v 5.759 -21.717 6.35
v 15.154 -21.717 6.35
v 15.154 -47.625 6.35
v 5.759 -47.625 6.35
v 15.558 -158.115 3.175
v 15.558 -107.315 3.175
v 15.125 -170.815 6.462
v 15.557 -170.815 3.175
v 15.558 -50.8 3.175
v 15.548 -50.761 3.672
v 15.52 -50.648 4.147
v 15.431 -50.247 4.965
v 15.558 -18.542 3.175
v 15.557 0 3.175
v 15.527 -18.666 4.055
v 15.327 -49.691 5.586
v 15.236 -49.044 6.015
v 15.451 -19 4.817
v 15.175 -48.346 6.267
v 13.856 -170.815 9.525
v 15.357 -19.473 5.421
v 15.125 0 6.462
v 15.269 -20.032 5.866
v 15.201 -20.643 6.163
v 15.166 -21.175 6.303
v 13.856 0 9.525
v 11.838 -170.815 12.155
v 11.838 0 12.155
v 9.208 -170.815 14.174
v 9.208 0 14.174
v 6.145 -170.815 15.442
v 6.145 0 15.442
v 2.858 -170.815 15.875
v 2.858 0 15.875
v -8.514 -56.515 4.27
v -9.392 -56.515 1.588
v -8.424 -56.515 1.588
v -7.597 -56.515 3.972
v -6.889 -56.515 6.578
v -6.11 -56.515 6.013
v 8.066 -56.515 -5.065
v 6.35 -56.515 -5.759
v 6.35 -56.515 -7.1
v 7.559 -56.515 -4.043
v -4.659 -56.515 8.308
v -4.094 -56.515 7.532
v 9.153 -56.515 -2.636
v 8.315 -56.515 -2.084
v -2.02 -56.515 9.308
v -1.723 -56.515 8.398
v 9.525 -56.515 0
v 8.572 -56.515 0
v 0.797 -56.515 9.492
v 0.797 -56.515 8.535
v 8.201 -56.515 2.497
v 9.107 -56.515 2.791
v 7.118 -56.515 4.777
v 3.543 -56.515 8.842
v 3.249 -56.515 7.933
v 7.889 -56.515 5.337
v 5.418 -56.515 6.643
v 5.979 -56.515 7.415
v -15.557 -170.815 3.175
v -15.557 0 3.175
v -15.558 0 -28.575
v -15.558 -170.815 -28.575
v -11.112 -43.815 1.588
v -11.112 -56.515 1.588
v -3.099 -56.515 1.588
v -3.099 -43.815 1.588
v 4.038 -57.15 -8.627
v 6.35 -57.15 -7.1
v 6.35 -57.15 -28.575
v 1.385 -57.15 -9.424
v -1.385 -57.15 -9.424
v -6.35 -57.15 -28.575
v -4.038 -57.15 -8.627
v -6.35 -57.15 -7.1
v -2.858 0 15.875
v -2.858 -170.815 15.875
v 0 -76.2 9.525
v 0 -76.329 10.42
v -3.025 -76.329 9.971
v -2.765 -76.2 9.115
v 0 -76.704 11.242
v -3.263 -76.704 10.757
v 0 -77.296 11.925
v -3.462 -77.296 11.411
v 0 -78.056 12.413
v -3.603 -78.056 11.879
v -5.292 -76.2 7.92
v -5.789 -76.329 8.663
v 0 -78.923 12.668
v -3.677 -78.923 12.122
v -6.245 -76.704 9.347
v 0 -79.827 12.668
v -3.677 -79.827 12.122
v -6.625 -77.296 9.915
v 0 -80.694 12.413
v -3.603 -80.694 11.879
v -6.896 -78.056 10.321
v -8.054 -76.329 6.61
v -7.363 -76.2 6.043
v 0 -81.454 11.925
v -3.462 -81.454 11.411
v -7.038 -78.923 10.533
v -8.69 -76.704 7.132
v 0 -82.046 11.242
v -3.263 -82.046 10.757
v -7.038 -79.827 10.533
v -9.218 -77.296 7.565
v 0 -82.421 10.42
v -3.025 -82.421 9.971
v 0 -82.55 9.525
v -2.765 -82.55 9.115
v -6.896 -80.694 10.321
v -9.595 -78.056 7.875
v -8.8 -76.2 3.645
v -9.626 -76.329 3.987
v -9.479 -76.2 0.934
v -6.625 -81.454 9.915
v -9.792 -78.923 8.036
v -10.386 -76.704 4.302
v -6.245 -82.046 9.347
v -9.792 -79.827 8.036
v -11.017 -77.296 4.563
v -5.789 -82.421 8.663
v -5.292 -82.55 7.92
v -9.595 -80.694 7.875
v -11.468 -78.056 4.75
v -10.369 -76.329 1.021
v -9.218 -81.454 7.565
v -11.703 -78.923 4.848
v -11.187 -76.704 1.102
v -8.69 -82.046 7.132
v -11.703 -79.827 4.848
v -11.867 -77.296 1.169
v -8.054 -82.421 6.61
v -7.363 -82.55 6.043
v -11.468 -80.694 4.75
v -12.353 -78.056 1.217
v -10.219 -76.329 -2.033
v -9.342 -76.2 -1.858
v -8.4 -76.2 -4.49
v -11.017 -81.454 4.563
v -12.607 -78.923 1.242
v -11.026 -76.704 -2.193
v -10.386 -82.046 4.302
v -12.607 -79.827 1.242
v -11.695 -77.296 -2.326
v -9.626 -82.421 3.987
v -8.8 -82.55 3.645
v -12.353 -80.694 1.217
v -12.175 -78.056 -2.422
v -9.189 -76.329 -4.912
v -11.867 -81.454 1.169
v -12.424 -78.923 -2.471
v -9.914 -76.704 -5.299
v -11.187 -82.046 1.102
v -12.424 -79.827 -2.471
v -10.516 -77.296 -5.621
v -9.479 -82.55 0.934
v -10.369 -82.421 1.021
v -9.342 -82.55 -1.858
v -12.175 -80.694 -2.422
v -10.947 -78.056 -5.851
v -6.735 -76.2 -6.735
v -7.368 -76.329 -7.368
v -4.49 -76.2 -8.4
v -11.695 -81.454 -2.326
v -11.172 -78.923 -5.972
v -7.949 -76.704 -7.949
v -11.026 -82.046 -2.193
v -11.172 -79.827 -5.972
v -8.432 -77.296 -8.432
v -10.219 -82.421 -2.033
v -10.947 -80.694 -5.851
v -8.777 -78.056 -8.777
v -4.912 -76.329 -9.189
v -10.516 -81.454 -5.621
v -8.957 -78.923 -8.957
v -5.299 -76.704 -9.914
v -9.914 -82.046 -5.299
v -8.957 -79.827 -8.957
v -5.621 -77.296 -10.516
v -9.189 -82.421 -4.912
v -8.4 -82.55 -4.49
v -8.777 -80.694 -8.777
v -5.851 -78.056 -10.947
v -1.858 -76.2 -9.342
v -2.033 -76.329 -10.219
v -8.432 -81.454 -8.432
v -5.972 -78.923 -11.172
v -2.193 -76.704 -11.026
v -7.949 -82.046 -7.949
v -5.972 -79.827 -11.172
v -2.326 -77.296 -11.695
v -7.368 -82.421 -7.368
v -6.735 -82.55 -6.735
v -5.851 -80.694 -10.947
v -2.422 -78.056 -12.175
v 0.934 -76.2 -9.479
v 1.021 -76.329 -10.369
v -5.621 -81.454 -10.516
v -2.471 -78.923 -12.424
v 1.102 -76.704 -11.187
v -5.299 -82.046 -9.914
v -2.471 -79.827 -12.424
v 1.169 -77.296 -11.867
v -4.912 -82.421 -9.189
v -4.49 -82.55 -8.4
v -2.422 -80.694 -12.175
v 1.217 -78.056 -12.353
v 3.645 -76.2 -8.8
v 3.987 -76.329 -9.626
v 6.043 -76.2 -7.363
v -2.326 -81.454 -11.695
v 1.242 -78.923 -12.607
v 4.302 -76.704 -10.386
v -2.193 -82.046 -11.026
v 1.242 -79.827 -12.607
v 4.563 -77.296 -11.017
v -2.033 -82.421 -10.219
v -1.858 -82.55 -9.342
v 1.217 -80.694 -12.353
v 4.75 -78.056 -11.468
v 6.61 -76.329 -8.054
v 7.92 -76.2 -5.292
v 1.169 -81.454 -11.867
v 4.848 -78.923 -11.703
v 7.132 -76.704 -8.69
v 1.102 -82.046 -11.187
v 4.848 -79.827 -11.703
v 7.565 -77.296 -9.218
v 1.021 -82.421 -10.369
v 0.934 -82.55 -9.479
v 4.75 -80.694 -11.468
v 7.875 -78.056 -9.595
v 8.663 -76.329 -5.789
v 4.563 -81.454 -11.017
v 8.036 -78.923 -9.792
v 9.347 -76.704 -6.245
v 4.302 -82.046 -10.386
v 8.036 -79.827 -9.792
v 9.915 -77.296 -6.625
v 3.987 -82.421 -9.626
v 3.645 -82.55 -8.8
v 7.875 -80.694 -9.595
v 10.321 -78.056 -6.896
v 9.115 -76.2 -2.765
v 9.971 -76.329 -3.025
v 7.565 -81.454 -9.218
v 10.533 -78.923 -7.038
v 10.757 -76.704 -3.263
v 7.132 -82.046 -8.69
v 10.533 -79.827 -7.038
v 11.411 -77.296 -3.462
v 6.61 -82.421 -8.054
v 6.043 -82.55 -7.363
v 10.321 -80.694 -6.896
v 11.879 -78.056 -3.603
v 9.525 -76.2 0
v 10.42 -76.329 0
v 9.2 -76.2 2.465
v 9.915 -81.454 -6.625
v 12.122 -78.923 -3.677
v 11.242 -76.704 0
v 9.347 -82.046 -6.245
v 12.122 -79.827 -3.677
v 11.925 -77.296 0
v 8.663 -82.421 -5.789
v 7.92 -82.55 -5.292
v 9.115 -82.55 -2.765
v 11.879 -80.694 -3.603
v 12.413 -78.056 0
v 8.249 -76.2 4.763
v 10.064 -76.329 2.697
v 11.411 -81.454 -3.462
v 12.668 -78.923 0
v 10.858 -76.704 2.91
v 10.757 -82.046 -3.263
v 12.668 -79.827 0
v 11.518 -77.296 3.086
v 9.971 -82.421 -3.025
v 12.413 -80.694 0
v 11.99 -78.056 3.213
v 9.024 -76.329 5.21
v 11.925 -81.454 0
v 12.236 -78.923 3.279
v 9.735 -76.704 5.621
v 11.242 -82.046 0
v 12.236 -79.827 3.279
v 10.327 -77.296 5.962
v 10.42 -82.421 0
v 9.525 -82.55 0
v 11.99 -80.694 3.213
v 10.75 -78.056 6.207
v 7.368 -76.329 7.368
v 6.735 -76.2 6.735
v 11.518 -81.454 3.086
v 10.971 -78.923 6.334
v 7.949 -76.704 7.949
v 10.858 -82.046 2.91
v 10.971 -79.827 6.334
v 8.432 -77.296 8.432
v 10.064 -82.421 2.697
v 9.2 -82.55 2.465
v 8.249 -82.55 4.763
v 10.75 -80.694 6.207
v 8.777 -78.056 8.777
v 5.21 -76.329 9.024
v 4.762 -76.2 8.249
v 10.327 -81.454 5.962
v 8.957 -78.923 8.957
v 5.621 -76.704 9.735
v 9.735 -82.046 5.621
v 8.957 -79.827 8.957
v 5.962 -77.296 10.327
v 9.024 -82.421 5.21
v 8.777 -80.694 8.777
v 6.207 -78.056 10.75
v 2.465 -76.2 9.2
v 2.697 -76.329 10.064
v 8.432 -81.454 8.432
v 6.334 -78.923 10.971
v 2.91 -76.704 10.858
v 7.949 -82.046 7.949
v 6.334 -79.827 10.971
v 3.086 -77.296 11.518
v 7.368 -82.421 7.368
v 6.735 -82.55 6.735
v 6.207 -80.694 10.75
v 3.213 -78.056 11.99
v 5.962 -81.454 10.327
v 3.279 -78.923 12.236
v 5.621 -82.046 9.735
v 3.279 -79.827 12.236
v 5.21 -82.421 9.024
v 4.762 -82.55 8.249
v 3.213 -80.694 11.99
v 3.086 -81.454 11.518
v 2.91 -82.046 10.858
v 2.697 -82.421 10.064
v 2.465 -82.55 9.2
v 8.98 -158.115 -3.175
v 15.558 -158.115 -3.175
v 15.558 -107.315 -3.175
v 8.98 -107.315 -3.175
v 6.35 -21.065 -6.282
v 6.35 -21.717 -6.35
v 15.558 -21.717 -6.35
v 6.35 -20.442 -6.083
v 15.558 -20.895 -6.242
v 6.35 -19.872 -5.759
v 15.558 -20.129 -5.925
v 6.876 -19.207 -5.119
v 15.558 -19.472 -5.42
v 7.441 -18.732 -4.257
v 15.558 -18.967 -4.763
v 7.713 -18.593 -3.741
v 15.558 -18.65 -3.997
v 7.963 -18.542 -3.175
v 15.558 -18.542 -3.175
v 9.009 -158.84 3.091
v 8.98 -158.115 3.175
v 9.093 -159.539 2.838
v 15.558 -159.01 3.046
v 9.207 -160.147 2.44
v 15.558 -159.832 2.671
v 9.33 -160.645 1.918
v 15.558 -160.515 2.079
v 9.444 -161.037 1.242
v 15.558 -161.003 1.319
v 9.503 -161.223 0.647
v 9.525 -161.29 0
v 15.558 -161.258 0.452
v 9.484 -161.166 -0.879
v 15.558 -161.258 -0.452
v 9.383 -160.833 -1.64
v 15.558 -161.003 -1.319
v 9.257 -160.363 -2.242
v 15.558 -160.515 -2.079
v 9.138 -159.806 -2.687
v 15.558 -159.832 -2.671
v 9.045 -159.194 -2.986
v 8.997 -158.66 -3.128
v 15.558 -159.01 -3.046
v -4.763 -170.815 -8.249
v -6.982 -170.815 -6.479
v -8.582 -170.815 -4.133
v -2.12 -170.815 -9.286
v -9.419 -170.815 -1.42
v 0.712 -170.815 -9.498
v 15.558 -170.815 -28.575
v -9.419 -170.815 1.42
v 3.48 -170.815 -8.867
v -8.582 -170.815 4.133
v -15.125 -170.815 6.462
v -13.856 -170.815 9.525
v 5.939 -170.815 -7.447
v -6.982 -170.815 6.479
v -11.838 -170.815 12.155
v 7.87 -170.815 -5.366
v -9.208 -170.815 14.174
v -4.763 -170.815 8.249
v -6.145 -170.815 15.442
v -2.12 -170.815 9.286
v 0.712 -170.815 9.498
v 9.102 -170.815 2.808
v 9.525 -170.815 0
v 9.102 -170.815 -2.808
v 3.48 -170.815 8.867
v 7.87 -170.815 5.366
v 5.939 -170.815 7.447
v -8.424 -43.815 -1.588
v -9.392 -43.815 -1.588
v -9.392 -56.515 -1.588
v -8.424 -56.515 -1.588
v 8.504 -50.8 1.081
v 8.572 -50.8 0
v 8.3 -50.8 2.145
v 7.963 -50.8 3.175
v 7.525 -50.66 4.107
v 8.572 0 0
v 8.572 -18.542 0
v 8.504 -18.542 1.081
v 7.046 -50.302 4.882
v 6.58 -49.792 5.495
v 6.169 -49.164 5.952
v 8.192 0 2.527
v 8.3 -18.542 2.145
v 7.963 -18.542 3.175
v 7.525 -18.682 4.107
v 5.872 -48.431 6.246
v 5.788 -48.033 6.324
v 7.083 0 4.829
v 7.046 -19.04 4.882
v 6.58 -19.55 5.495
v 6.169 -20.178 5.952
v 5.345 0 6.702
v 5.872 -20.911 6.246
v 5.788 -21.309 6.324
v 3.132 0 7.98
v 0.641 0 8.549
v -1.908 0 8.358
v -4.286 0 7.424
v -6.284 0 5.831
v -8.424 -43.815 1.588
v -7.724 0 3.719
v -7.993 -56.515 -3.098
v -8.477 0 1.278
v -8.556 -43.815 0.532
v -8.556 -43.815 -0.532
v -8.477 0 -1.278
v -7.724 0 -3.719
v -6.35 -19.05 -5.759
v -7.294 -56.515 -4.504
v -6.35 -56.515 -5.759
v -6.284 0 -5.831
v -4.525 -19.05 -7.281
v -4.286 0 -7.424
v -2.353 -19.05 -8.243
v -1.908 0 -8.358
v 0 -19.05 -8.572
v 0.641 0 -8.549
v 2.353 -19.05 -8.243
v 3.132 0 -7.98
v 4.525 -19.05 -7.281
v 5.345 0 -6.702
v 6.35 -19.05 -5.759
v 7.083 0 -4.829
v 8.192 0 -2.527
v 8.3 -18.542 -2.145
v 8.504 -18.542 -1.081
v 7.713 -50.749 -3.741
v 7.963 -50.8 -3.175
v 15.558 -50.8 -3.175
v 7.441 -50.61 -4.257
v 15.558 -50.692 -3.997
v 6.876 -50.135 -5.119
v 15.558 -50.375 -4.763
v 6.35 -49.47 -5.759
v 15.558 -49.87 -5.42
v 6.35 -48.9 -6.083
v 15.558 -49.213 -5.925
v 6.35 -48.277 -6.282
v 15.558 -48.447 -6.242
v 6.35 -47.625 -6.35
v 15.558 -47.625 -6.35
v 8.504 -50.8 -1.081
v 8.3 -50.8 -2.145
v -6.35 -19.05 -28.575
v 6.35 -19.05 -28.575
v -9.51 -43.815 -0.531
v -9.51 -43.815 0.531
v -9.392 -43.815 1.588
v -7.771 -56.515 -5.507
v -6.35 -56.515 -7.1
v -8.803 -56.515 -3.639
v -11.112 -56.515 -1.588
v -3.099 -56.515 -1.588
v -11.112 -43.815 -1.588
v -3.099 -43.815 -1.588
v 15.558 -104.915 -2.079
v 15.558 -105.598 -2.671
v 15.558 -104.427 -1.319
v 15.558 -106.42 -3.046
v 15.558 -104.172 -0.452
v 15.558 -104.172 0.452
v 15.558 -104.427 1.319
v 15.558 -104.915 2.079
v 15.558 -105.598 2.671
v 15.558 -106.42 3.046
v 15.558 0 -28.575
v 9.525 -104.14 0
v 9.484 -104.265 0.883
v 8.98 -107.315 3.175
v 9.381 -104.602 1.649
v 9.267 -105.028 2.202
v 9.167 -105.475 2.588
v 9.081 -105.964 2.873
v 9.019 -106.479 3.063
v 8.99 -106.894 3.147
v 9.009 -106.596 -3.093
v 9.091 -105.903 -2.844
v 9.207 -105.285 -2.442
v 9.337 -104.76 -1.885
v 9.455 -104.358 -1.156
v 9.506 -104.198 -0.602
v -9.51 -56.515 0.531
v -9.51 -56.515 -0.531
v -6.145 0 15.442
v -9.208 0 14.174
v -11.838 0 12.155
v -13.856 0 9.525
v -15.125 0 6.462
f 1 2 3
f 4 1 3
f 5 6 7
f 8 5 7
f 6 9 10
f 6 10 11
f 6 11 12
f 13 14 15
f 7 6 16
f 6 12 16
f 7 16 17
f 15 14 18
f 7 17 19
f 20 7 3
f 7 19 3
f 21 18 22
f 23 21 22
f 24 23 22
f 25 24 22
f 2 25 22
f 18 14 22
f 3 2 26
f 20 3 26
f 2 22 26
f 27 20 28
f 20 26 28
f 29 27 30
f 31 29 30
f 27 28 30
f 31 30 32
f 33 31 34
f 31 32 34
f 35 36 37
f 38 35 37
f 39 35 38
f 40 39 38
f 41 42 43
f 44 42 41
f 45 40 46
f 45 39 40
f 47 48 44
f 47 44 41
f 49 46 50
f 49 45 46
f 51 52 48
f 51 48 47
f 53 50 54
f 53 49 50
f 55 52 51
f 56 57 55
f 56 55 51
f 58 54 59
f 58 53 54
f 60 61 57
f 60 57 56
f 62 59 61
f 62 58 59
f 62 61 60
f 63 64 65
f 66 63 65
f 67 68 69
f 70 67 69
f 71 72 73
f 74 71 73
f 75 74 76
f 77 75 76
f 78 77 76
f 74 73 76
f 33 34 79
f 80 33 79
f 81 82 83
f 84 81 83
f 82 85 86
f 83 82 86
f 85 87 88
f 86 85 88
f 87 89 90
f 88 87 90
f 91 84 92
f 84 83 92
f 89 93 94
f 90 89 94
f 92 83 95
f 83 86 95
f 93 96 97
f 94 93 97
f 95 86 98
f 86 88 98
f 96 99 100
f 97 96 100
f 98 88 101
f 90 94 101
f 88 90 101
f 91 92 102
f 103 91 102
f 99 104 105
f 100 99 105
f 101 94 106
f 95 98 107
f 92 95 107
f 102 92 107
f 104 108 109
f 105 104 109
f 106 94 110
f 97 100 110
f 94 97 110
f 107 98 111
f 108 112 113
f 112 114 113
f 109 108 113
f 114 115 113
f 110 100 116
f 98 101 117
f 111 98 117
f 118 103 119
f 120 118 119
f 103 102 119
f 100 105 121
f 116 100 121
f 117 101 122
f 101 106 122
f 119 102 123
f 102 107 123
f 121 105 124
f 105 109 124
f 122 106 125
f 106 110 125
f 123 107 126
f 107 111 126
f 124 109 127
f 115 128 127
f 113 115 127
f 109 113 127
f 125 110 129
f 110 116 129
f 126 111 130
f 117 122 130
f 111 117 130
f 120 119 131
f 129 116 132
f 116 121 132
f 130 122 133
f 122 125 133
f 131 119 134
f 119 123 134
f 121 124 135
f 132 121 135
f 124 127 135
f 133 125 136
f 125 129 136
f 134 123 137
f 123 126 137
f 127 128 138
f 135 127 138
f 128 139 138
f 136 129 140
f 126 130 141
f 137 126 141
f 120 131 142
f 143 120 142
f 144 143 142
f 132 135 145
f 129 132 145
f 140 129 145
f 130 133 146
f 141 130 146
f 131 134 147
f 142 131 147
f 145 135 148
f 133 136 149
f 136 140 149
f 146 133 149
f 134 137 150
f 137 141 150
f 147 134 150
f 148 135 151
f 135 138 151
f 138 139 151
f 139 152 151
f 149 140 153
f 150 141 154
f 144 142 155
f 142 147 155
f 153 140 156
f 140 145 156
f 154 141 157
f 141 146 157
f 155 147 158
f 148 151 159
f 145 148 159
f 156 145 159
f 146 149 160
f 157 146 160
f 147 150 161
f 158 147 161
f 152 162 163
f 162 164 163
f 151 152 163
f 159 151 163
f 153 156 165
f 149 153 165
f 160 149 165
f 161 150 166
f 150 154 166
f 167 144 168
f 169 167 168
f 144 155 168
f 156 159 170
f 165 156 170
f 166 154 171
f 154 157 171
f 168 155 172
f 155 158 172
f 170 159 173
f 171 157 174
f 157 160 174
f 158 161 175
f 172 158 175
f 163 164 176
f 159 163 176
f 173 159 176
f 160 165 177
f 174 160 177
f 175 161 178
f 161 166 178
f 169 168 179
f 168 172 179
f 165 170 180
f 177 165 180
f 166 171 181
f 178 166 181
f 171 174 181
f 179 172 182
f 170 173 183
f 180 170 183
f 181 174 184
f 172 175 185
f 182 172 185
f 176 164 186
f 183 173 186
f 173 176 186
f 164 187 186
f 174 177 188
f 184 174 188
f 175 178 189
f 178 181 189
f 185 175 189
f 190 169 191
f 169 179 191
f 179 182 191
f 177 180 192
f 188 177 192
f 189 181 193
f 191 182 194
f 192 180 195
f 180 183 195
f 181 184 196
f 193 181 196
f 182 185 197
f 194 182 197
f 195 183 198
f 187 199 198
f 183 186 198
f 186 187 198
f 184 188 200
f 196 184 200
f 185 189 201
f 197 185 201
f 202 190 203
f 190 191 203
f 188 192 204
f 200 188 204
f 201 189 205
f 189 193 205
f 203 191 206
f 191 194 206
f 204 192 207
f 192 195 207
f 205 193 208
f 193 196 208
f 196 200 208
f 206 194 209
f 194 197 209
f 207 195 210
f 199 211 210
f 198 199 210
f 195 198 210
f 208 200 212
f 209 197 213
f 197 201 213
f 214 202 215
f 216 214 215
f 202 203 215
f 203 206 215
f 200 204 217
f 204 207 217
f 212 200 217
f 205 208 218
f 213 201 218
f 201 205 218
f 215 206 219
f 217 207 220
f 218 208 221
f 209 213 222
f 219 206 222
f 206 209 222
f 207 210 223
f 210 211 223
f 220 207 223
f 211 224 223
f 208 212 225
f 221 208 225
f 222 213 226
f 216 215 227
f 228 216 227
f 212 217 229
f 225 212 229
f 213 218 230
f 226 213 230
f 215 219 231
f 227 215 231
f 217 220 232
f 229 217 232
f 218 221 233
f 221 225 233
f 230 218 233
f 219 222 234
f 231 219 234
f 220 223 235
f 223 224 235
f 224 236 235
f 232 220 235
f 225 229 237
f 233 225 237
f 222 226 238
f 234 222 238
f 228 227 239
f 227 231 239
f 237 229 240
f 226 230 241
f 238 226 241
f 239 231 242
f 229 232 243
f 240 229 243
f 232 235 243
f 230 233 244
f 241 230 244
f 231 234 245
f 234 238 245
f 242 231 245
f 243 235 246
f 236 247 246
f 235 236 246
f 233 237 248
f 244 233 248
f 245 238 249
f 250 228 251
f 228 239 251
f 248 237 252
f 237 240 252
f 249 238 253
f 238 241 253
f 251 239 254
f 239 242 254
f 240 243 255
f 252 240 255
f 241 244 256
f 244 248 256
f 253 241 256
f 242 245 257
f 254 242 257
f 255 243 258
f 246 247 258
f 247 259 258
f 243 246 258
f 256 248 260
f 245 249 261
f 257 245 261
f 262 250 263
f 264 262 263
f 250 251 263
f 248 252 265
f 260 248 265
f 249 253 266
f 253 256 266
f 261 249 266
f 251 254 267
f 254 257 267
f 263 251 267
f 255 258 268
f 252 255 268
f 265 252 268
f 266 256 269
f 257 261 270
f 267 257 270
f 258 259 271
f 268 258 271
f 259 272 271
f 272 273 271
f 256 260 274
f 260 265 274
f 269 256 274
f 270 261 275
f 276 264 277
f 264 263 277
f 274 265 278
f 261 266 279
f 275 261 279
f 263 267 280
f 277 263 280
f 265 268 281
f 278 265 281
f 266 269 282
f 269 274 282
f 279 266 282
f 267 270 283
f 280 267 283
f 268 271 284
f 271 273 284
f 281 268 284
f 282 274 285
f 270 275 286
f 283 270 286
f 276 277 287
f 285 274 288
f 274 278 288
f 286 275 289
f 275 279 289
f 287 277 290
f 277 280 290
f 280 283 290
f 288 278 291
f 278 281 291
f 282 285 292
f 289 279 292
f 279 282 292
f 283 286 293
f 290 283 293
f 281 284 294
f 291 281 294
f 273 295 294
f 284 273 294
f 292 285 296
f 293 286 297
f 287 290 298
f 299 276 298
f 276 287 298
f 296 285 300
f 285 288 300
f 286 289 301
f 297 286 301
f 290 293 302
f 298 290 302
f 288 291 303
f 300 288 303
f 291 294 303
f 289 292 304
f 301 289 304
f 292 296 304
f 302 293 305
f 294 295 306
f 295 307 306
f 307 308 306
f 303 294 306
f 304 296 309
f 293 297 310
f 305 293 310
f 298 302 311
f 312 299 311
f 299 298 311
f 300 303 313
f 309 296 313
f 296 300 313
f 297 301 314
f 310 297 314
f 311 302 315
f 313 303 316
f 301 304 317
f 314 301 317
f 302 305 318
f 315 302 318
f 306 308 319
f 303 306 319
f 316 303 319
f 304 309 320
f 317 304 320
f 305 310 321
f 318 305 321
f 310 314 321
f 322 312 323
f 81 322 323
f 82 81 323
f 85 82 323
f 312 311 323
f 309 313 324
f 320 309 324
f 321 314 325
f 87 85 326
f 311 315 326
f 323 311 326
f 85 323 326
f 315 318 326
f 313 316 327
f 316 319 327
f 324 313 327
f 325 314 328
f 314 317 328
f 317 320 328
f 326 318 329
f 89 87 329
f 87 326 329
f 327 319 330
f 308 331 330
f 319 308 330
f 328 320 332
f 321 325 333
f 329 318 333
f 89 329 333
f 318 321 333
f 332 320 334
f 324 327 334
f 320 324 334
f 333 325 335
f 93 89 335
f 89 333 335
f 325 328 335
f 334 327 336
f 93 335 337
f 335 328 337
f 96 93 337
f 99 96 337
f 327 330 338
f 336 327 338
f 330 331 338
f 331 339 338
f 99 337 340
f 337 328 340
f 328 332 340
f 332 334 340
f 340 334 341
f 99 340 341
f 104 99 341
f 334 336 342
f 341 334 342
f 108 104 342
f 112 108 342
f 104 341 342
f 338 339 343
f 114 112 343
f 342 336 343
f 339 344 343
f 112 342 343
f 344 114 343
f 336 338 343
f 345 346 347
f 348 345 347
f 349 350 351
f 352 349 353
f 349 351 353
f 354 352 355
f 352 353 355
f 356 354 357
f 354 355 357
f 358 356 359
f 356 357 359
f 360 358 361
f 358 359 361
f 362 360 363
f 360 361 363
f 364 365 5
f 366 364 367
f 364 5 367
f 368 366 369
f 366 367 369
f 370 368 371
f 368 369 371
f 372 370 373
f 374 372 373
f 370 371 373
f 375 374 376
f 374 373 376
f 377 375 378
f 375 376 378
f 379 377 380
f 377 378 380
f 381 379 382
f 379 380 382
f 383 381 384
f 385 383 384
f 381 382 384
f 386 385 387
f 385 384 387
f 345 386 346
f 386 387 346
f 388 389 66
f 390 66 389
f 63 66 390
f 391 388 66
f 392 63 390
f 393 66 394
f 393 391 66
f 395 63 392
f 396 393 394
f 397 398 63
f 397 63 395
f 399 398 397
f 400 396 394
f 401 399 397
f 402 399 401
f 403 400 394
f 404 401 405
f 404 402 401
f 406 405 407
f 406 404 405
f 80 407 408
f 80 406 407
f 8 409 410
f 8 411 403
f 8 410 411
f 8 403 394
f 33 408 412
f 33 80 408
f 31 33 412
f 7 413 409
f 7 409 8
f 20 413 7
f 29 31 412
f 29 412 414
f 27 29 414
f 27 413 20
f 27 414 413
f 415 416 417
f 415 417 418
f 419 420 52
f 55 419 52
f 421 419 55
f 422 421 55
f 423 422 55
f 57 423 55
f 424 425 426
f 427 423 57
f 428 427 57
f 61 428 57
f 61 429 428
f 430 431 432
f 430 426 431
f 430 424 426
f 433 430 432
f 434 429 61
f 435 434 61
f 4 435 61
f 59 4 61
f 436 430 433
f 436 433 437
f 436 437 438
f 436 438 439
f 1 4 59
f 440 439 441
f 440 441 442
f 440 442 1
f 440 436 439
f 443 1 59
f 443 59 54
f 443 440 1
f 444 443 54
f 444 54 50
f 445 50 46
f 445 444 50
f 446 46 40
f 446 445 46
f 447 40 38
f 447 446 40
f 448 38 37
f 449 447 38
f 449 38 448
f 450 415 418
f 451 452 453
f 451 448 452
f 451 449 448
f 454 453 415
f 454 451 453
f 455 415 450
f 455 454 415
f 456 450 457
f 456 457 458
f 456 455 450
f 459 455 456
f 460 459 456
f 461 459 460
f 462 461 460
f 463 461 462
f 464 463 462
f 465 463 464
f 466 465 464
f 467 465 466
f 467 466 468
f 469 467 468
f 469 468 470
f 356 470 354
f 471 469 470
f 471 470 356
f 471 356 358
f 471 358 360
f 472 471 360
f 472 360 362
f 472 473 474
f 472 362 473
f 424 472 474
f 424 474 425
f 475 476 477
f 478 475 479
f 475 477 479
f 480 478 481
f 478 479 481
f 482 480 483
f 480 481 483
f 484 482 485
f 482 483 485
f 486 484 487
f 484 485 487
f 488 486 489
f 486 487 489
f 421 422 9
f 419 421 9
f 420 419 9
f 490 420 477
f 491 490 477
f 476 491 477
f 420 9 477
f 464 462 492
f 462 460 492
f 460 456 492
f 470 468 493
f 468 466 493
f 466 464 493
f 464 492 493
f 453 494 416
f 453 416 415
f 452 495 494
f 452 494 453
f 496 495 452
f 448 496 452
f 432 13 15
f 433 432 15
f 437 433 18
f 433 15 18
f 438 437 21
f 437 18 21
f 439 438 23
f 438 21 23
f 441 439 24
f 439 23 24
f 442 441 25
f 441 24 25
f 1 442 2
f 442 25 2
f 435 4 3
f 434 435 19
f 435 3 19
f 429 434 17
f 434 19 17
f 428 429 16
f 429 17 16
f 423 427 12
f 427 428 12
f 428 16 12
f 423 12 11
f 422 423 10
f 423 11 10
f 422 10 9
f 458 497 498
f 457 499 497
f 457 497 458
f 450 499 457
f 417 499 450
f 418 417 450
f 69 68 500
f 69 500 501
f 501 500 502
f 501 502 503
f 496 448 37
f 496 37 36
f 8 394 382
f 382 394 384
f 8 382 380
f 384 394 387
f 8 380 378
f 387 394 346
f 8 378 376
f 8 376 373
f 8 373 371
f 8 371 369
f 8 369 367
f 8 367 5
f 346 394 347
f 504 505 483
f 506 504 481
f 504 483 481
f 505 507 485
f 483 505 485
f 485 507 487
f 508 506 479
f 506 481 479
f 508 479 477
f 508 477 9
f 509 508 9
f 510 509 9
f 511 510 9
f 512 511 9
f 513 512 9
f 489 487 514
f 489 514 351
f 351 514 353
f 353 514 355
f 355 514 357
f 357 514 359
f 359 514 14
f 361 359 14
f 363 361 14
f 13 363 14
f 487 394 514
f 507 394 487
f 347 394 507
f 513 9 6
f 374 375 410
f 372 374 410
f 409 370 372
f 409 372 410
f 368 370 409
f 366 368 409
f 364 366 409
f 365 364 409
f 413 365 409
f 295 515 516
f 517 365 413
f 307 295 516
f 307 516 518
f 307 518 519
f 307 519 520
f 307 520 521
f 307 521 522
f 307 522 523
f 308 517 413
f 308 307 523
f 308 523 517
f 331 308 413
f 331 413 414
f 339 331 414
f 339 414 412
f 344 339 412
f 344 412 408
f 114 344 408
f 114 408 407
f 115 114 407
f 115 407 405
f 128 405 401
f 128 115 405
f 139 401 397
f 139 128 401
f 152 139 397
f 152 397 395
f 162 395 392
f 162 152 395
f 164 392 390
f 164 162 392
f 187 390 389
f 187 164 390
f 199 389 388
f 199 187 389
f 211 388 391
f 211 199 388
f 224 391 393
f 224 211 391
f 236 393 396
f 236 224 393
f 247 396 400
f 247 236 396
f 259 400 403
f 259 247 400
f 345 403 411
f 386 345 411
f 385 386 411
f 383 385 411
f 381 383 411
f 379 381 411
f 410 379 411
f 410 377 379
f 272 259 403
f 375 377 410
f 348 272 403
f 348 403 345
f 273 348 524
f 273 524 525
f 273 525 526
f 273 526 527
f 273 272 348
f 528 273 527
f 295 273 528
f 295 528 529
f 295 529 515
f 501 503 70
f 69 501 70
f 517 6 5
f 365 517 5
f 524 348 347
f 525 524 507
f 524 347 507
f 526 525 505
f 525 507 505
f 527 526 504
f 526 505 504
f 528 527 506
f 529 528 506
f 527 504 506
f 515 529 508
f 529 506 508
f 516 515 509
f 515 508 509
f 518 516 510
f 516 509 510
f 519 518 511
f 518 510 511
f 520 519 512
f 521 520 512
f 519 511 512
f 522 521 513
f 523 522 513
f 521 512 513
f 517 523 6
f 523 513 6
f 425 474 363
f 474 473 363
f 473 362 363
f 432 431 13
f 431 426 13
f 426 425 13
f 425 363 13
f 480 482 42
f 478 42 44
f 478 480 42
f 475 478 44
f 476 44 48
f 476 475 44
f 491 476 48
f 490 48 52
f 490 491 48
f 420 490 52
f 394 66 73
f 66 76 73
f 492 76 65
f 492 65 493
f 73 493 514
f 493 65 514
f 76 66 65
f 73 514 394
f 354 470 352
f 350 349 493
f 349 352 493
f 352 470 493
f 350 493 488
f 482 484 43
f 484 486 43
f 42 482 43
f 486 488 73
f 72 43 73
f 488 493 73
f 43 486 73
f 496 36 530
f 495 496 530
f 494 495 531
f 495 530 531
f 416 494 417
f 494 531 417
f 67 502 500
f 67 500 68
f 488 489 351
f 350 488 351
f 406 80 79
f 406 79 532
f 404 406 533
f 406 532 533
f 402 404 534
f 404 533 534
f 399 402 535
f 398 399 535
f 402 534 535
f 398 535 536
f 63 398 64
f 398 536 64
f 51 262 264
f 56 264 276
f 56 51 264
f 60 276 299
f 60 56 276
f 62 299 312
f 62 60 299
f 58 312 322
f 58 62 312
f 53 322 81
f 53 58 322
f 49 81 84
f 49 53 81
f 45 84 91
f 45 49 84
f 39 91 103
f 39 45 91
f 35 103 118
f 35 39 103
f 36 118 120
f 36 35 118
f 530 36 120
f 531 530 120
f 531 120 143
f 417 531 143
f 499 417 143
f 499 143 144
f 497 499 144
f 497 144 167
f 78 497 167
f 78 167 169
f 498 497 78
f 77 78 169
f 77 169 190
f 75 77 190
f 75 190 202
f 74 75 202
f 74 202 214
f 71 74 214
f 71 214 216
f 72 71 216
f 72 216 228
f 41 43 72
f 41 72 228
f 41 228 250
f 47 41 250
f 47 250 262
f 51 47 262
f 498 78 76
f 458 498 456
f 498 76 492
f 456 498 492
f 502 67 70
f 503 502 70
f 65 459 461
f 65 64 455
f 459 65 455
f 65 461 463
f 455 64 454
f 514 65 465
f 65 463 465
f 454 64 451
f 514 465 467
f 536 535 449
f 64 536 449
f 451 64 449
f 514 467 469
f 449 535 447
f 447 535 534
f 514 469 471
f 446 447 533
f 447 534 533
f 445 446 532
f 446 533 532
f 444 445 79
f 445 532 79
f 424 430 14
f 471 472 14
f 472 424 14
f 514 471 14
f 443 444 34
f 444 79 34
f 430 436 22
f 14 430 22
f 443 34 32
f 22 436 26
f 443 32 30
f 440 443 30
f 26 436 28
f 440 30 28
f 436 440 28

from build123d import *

# Parameters (mm, degrees)
F0_R      = 9.525
F1_DEPTH  = 170.815
F0_R_2    = 8.5725
F2_DEPTH  = 56.515
F4_DEPTH  = 19.05
F6_DEPTH  = 12.7
F5_W      = 8.0137
F5_H      = 3.175
F7_DEPTH  = 12.7
F11_DEPTH = 12.7
F13_DEPTH = 29.21


with BuildPart() as f1:
    # F0 (on Front) → F1 (new body)
    with BuildSketch(Plane.XZ):
        with BuildLine():
            Line((2.8575, 15.875), (-2.8575, 15.875))
            ThreePointArc((-2.8575, 15.875), (-11.8377561211, 12.1552561211), (-15.5575, 3.175))
            Line((-15.5575, 3.175), (-15.5575, -28.575))
            Line((-15.5575, -28.575), (15.5575, -28.575))
            Line((15.5575, -28.575), (15.5575, 3.175))
            ThreePointArc((15.5575, 3.175), (11.8377561211, 12.1552561211), (2.8575, 15.875))
        make_face()
        Circle(F0_R, mode=Mode.SUBTRACT)
    extrude(amount=F1_DEPTH)

    # F0 (on Front) → F2 (join)
    with BuildSketch(Plane.XZ):
        Circle(F0_R)
        Circle(F0_R_2, mode=Mode.SUBTRACT)
    extrude(amount=F2_DEPTH)

    # F3 (on face) → F4 (cut)
    with BuildSketch(Plane.YZ.offset(15.5575)):
        with BuildLine():
            Line((-21.717, 6.35), (-47.625, 6.35))
            ThreePointArc((-47.625, 6.35), (-49.8700640303, 5.4200640303), (-50.8, 3.175))
            Line((-50.8, 3.175), (-18.542, 3.175))
            ThreePointArc((-18.542, 3.175), (-19.4719359697, 5.4200640303), (-21.717, 6.35))
        make_face()
        with BuildLine():
            Line((-18.542, 3.175), (-50.8, 3.175))
            Line((-50.8, 3.175), (-50.8, -3.175))
            ThreePointArc((-50.8, -3.175), (-49.8700640303, -5.4200640303), (-47.625, -6.35))
            Line((-47.625, -6.35), (-21.717, -6.35))
            ThreePointArc((-21.717, -6.35), (-19.4719359697, -5.4200640303), (-18.542, -3.175))
            Line((-18.542, -3.175), (-18.542, 3.175))
        make_face()
    extrude(amount=-F4_DEPTH, mode=Mode.SUBTRACT)

    # F5 (on face) → F6 (cut)
    with BuildSketch(Plane.XZ.offset(56.515)):
        with BuildLine():
            ThreePointArc((-8.4242269675, -1.5875), (-8.5725, 0), (-8.4242269675, 1.5875))
            Line((-8.4242269675, 1.5875), (-9.3917766557, 1.5875))
            ThreePointArc((-9.3917766557, 1.5875), (-9.525, 0), (-9.3917766557, -1.5875))
            Line((-9.3917766557, -1.5875), (-8.4242269675, -1.5875))
        make_face()
    extrude(amount=-F6_DEPTH, mode=Mode.SUBTRACT)

    # F8 (on Right) → F9 (revolve, cut)
    with BuildSketch(Plane.YZ):
        with BuildLine():
            Line((-76.2, 0), (-76.2, 9.525))
            ThreePointArc((-76.2, 9.525), (-79.375, 12.7), (-82.55, 9.525))
            Line((-82.55, 9.525), (-82.55, 0))
            Line((-82.55, 0), (-76.2, 0))
        make_face()
    revolve(axis=Axis((0, -79.375, 0), (0, -1, 0)), mode=Mode.SUBTRACT)

    # F10 (on face) → F11 (cut)
    with BuildSketch(Plane.YZ.offset(15.5575)):
        with BuildLine():
            ThreePointArc((-107.315, -3.175), (-104.14, 0), (-107.315, 3.175))
            Line((-107.315, 3.175), (-158.115, 3.175))
            ThreePointArc((-158.115, 3.175), (-161.29, 0), (-158.115, -3.175))
            Line((-158.115, -3.175), (-107.315, -3.175))
        make_face()
    extrude(amount=-F11_DEPTH, mode=Mode.SUBTRACT)

    # F12 (on face) → F13 (cut)
    with BuildSketch(Plane(origin=(0, 0, -28.575), x_dir=(1, 0, 0), z_dir=(0, 0, -1))):
        Polygon((-6.35, 19.05), (0, 19.05), (6.35, 19.05), (6.35, 57.15), (0, 57.15), (-6.35, 57.15), align=None)
    extrude(amount=-F13_DEPTH, mode=Mode.SUBTRACT)


with BuildPart() as f7:
    # F5 (on face) → F7 (new body)
    with BuildSketch(Plane.XZ.offset(56.515)):
        with Locations((-7.10565, 0)):
            Rectangle(F5_W, F5_H)
    extrude(amount=-F7_DEPTH)


solid = Compound([f1.part, f7.part])
